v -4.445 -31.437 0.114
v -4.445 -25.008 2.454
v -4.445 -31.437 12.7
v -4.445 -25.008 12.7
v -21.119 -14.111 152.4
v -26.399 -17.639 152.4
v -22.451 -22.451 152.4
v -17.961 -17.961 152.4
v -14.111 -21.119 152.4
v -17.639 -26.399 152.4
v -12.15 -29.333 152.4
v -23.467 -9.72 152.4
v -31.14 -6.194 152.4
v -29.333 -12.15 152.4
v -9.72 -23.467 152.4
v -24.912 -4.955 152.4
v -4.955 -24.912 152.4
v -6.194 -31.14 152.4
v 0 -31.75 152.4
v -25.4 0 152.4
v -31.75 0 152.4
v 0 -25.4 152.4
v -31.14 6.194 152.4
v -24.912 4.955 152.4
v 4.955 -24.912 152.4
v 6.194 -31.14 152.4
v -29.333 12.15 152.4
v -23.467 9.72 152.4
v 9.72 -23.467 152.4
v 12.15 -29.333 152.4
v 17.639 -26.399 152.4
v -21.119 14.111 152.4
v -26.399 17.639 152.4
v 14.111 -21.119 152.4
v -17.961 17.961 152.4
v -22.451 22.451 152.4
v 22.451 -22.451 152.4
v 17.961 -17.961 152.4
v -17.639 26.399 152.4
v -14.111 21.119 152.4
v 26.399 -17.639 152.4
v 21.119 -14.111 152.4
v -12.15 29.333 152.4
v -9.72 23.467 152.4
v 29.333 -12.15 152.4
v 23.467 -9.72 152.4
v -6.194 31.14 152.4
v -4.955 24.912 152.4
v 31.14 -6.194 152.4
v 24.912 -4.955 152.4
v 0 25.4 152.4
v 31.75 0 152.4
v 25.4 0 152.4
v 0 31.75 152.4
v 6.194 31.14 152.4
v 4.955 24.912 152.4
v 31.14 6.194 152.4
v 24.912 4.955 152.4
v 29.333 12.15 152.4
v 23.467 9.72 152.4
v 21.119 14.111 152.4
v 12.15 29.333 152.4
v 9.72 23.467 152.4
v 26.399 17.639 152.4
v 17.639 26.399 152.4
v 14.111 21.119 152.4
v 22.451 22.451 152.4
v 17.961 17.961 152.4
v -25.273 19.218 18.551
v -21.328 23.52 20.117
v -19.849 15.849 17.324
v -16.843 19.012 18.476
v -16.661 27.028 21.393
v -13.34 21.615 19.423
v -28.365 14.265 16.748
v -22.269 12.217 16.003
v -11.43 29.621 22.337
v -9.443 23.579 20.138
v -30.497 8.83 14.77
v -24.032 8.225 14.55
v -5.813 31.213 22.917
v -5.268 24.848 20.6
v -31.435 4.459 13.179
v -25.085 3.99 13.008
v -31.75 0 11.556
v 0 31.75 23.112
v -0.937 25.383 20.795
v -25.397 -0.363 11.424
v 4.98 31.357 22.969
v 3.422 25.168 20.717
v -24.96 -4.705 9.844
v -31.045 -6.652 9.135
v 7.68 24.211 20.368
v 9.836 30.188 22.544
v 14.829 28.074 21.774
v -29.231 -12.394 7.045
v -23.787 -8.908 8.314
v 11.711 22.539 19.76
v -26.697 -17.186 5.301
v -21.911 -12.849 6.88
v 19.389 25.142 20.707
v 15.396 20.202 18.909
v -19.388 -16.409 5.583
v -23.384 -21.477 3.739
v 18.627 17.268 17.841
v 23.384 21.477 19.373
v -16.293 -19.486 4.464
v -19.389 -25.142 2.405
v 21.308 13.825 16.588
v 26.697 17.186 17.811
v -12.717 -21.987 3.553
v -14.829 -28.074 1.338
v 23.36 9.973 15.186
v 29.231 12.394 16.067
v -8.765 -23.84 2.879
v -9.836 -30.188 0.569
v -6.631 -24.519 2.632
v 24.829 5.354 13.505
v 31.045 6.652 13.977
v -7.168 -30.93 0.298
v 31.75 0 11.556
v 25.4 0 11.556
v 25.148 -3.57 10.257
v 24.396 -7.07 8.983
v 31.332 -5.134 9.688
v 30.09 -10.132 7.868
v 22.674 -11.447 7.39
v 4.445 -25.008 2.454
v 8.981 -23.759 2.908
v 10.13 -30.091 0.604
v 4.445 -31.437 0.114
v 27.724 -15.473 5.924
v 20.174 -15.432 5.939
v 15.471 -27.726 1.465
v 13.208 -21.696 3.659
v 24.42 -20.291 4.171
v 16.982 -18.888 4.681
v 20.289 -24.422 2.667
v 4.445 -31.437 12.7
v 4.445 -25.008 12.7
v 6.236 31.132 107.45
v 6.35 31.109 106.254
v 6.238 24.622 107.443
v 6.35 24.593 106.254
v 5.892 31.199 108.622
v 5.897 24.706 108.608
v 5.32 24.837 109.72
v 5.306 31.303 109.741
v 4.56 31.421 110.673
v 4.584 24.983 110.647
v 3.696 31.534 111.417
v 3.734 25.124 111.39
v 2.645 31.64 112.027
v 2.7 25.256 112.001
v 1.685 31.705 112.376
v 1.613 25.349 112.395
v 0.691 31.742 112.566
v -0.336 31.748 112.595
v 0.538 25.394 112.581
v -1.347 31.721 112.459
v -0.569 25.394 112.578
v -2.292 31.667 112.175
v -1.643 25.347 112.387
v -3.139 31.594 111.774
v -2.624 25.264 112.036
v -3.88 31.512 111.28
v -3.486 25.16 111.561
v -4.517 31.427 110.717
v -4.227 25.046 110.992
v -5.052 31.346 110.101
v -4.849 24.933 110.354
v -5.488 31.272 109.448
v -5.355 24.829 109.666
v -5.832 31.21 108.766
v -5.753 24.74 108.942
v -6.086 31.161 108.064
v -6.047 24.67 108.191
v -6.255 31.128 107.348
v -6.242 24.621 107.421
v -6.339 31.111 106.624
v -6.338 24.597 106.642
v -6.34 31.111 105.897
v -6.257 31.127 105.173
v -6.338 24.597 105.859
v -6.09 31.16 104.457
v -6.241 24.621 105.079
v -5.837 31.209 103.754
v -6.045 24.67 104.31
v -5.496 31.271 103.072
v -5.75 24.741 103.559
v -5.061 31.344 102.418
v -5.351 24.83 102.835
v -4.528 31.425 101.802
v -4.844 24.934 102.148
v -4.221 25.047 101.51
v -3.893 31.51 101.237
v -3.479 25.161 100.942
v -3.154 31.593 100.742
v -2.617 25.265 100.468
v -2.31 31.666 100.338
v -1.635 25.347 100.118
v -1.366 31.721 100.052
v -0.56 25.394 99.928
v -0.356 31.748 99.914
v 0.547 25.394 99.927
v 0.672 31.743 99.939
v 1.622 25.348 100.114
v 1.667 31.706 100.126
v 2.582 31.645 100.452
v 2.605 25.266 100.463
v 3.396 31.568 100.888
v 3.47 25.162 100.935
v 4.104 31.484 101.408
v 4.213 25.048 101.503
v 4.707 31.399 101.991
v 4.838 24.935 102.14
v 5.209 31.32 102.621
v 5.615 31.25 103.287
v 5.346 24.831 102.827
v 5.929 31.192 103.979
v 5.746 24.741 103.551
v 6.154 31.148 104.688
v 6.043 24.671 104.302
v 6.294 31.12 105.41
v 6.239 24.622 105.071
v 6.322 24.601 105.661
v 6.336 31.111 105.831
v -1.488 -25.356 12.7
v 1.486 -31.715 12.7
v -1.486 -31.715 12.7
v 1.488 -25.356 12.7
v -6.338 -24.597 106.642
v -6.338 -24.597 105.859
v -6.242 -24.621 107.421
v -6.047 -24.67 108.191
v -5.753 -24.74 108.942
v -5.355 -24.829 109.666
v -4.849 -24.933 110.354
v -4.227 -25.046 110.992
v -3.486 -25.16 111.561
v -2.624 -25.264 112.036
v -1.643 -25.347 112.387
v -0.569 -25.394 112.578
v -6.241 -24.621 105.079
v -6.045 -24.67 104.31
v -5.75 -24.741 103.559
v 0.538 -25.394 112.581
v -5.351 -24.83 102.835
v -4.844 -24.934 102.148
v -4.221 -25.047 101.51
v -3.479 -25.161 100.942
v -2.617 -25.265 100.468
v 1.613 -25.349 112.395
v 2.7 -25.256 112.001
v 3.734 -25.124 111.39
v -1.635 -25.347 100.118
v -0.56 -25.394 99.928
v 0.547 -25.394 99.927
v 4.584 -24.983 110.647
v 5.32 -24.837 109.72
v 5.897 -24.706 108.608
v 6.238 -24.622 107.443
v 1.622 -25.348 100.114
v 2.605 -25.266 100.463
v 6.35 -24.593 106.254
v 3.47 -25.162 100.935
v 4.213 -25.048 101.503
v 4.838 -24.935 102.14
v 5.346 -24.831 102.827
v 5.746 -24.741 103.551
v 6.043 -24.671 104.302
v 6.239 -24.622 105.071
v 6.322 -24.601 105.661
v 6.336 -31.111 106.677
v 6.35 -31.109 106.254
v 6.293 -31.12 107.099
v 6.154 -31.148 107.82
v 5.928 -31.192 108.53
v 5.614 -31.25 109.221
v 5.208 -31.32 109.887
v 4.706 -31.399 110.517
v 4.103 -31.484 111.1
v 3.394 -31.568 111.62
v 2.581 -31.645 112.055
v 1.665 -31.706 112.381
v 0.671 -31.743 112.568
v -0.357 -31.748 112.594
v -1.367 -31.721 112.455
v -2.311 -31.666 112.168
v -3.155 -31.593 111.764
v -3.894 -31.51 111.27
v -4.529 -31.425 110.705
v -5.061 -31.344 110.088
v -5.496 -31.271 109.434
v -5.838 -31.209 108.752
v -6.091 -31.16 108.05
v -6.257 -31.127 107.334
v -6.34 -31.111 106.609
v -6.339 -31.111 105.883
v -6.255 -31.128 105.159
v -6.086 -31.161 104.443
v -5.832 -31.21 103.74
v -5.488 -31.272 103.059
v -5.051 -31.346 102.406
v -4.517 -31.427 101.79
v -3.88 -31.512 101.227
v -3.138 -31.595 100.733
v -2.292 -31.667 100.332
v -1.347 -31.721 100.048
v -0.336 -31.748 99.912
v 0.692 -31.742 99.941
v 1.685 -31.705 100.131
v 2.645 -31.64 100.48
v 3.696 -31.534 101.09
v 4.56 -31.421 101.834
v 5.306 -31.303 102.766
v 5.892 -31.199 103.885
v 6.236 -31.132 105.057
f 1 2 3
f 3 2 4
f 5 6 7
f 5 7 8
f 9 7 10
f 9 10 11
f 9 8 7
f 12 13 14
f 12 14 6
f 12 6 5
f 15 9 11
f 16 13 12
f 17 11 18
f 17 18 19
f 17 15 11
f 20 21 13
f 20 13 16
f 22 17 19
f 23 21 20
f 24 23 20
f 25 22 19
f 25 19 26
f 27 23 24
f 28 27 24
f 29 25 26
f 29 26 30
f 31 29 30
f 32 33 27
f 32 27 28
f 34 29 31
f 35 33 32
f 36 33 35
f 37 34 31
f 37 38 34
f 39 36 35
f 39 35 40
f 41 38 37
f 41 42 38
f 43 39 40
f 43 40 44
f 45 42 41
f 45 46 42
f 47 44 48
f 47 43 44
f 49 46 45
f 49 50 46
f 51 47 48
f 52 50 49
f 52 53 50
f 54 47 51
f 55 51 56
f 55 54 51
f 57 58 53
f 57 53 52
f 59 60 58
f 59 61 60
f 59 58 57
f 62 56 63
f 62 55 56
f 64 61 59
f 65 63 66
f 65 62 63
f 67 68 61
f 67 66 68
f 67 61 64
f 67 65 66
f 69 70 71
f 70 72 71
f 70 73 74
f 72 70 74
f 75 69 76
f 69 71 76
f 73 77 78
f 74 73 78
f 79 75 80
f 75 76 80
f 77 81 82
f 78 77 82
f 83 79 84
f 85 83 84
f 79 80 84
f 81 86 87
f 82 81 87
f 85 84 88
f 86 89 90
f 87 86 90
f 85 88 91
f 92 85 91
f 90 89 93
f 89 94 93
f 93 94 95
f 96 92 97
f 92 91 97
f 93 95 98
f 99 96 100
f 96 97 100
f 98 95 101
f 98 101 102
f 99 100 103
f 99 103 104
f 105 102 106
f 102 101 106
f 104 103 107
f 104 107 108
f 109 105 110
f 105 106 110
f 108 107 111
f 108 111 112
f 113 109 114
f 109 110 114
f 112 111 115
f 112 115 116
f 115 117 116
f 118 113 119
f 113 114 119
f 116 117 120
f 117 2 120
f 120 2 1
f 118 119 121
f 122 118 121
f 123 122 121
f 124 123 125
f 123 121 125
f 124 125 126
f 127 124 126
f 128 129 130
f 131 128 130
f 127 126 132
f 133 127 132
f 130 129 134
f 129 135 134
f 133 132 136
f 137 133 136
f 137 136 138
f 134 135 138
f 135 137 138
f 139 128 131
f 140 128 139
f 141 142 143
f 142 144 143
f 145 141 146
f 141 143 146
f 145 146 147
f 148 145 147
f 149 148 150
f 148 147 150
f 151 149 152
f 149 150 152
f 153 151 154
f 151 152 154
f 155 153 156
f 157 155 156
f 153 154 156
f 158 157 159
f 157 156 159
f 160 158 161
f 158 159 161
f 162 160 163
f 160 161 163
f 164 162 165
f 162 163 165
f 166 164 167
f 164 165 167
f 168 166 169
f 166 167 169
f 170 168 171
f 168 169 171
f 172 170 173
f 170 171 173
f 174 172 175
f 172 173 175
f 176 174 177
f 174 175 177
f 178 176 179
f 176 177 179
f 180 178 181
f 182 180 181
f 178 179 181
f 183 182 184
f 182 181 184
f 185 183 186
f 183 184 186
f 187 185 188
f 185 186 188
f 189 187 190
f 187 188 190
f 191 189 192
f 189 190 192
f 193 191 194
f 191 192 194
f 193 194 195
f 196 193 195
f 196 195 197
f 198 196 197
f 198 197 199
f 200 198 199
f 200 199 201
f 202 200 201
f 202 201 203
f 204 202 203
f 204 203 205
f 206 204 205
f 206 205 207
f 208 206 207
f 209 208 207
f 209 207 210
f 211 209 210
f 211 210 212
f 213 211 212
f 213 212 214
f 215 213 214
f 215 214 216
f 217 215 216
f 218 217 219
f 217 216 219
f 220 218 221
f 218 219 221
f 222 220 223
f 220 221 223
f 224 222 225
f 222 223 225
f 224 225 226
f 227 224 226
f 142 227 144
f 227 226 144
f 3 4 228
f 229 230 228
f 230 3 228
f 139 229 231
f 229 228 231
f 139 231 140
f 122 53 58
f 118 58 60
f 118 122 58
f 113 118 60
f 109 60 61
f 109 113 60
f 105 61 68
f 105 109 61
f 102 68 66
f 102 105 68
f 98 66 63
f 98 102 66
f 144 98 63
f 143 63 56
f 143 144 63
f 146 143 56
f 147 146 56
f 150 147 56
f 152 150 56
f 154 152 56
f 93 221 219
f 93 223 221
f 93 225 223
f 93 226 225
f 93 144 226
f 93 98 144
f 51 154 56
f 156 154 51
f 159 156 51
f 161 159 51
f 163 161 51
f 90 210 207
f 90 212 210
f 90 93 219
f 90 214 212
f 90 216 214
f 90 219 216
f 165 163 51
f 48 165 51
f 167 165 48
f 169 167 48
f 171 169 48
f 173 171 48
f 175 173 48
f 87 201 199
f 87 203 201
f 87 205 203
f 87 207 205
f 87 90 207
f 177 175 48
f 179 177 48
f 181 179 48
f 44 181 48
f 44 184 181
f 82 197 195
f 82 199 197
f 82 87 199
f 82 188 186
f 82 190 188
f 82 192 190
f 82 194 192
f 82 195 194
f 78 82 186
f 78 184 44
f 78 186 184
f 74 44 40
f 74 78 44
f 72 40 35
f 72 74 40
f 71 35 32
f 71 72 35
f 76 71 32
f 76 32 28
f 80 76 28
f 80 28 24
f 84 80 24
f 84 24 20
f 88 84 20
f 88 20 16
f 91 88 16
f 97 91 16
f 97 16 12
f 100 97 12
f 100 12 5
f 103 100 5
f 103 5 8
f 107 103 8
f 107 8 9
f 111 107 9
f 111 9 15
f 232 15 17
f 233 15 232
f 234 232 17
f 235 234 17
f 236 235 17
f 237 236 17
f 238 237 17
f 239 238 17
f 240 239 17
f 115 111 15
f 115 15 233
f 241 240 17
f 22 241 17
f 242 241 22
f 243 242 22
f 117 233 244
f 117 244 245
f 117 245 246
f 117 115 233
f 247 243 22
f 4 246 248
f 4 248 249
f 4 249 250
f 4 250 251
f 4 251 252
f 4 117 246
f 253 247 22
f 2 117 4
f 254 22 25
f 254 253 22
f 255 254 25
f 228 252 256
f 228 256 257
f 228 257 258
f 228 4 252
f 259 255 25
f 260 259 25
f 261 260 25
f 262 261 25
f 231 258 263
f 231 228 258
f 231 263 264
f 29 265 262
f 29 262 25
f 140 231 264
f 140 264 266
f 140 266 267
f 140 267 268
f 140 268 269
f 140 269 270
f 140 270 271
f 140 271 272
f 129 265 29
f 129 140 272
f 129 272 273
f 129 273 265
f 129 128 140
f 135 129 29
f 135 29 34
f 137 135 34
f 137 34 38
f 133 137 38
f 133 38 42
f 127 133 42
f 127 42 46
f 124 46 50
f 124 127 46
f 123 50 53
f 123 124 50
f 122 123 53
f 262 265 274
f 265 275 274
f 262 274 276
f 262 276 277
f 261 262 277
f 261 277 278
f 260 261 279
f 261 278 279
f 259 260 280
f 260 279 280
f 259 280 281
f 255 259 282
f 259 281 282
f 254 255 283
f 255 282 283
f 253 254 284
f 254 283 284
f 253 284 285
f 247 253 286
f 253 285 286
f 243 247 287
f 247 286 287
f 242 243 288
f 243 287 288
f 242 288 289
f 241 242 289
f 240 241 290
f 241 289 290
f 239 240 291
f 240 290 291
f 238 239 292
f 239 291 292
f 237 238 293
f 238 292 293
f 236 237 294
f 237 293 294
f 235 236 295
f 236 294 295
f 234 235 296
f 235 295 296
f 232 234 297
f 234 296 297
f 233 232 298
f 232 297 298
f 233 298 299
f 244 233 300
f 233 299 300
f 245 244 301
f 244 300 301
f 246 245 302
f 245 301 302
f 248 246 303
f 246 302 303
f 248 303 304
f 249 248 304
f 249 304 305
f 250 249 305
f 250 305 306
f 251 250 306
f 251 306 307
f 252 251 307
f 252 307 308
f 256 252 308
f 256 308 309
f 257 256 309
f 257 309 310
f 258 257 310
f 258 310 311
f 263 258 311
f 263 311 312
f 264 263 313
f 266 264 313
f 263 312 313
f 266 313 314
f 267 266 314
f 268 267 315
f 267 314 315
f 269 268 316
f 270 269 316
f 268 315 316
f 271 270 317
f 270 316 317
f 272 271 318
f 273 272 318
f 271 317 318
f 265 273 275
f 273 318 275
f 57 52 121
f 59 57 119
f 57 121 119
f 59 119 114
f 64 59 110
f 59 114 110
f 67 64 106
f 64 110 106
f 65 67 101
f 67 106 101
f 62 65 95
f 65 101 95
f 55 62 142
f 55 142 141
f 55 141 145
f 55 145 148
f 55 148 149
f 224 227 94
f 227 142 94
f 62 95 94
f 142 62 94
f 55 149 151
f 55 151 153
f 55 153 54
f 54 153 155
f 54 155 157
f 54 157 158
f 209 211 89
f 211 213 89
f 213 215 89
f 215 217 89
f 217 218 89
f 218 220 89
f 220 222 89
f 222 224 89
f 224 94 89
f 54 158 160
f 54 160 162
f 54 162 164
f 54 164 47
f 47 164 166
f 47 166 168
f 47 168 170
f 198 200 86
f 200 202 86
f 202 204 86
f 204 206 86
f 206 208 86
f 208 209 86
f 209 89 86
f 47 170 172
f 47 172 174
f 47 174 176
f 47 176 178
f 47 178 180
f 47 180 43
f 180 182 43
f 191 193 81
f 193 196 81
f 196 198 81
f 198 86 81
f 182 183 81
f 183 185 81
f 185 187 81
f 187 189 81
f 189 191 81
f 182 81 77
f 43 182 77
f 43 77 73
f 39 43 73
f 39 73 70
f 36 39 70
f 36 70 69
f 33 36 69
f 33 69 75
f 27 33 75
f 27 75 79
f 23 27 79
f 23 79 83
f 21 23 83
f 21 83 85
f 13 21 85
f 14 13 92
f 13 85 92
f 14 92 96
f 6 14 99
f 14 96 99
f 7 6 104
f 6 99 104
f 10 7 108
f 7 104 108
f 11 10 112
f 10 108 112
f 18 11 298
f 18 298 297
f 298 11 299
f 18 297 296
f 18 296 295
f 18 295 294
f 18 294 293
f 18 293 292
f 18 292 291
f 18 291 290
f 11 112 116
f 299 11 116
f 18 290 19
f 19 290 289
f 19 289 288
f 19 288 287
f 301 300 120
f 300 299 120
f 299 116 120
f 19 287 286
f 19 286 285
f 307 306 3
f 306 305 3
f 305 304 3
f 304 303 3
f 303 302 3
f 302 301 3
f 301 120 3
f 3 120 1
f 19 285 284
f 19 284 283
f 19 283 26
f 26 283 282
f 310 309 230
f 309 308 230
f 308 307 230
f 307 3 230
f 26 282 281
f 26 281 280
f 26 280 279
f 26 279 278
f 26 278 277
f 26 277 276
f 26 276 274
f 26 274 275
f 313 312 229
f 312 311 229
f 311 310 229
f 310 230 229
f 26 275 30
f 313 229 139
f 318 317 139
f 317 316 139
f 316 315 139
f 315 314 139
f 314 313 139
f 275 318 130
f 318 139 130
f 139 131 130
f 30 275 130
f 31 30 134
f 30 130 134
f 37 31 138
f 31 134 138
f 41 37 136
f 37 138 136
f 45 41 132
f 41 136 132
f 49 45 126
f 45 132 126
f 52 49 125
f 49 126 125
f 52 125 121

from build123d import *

# Parameters (mm, degrees)
F0_R     = 31.75
F0_R_2   = 25.4
F1_DEPTH = 152.4
F3_DEPTH = 31.75
F4_R     = 6.35
F5_DEPTH = 31.75
F6_W     = 8.89
F6_H     = 25.4
F7_DEPTH = 38.1


with BuildPart() as f1:
    # F0 (on Top) → F1 (new body)
    with BuildSketch(Plane.XY):
        Circle(F0_R)
        Circle(F0_R_2, mode=Mode.SUBTRACT)
    extrude(amount=F1_DEPTH)

    # F2 (on Right) → F3 (cut, symmetric)
    with BuildSketch(Plane.YZ):
        Polygon((-31.75, 0), (31.75, 0), (31.75, 23.1121098759), align=None)
    extrude(amount=F3_DEPTH, both=True, mode=Mode.SUBTRACT)

    # F4 (on Front) → F5 (cut, symmetric)
    with BuildSketch(Plane.XZ):
        with Locations((0, 106.2535495254)):
            Circle(F4_R)
    extrude(amount=F5_DEPTH, both=True, mode=Mode.SUBTRACT)

    # F6 (on Front) → F7 (cut)
    with BuildSketch(Plane.XZ):
        Rectangle(F6_W, F6_H)
    extrude(amount=F7_DEPTH, mode=Mode.SUBTRACT)


solid = f1.part
